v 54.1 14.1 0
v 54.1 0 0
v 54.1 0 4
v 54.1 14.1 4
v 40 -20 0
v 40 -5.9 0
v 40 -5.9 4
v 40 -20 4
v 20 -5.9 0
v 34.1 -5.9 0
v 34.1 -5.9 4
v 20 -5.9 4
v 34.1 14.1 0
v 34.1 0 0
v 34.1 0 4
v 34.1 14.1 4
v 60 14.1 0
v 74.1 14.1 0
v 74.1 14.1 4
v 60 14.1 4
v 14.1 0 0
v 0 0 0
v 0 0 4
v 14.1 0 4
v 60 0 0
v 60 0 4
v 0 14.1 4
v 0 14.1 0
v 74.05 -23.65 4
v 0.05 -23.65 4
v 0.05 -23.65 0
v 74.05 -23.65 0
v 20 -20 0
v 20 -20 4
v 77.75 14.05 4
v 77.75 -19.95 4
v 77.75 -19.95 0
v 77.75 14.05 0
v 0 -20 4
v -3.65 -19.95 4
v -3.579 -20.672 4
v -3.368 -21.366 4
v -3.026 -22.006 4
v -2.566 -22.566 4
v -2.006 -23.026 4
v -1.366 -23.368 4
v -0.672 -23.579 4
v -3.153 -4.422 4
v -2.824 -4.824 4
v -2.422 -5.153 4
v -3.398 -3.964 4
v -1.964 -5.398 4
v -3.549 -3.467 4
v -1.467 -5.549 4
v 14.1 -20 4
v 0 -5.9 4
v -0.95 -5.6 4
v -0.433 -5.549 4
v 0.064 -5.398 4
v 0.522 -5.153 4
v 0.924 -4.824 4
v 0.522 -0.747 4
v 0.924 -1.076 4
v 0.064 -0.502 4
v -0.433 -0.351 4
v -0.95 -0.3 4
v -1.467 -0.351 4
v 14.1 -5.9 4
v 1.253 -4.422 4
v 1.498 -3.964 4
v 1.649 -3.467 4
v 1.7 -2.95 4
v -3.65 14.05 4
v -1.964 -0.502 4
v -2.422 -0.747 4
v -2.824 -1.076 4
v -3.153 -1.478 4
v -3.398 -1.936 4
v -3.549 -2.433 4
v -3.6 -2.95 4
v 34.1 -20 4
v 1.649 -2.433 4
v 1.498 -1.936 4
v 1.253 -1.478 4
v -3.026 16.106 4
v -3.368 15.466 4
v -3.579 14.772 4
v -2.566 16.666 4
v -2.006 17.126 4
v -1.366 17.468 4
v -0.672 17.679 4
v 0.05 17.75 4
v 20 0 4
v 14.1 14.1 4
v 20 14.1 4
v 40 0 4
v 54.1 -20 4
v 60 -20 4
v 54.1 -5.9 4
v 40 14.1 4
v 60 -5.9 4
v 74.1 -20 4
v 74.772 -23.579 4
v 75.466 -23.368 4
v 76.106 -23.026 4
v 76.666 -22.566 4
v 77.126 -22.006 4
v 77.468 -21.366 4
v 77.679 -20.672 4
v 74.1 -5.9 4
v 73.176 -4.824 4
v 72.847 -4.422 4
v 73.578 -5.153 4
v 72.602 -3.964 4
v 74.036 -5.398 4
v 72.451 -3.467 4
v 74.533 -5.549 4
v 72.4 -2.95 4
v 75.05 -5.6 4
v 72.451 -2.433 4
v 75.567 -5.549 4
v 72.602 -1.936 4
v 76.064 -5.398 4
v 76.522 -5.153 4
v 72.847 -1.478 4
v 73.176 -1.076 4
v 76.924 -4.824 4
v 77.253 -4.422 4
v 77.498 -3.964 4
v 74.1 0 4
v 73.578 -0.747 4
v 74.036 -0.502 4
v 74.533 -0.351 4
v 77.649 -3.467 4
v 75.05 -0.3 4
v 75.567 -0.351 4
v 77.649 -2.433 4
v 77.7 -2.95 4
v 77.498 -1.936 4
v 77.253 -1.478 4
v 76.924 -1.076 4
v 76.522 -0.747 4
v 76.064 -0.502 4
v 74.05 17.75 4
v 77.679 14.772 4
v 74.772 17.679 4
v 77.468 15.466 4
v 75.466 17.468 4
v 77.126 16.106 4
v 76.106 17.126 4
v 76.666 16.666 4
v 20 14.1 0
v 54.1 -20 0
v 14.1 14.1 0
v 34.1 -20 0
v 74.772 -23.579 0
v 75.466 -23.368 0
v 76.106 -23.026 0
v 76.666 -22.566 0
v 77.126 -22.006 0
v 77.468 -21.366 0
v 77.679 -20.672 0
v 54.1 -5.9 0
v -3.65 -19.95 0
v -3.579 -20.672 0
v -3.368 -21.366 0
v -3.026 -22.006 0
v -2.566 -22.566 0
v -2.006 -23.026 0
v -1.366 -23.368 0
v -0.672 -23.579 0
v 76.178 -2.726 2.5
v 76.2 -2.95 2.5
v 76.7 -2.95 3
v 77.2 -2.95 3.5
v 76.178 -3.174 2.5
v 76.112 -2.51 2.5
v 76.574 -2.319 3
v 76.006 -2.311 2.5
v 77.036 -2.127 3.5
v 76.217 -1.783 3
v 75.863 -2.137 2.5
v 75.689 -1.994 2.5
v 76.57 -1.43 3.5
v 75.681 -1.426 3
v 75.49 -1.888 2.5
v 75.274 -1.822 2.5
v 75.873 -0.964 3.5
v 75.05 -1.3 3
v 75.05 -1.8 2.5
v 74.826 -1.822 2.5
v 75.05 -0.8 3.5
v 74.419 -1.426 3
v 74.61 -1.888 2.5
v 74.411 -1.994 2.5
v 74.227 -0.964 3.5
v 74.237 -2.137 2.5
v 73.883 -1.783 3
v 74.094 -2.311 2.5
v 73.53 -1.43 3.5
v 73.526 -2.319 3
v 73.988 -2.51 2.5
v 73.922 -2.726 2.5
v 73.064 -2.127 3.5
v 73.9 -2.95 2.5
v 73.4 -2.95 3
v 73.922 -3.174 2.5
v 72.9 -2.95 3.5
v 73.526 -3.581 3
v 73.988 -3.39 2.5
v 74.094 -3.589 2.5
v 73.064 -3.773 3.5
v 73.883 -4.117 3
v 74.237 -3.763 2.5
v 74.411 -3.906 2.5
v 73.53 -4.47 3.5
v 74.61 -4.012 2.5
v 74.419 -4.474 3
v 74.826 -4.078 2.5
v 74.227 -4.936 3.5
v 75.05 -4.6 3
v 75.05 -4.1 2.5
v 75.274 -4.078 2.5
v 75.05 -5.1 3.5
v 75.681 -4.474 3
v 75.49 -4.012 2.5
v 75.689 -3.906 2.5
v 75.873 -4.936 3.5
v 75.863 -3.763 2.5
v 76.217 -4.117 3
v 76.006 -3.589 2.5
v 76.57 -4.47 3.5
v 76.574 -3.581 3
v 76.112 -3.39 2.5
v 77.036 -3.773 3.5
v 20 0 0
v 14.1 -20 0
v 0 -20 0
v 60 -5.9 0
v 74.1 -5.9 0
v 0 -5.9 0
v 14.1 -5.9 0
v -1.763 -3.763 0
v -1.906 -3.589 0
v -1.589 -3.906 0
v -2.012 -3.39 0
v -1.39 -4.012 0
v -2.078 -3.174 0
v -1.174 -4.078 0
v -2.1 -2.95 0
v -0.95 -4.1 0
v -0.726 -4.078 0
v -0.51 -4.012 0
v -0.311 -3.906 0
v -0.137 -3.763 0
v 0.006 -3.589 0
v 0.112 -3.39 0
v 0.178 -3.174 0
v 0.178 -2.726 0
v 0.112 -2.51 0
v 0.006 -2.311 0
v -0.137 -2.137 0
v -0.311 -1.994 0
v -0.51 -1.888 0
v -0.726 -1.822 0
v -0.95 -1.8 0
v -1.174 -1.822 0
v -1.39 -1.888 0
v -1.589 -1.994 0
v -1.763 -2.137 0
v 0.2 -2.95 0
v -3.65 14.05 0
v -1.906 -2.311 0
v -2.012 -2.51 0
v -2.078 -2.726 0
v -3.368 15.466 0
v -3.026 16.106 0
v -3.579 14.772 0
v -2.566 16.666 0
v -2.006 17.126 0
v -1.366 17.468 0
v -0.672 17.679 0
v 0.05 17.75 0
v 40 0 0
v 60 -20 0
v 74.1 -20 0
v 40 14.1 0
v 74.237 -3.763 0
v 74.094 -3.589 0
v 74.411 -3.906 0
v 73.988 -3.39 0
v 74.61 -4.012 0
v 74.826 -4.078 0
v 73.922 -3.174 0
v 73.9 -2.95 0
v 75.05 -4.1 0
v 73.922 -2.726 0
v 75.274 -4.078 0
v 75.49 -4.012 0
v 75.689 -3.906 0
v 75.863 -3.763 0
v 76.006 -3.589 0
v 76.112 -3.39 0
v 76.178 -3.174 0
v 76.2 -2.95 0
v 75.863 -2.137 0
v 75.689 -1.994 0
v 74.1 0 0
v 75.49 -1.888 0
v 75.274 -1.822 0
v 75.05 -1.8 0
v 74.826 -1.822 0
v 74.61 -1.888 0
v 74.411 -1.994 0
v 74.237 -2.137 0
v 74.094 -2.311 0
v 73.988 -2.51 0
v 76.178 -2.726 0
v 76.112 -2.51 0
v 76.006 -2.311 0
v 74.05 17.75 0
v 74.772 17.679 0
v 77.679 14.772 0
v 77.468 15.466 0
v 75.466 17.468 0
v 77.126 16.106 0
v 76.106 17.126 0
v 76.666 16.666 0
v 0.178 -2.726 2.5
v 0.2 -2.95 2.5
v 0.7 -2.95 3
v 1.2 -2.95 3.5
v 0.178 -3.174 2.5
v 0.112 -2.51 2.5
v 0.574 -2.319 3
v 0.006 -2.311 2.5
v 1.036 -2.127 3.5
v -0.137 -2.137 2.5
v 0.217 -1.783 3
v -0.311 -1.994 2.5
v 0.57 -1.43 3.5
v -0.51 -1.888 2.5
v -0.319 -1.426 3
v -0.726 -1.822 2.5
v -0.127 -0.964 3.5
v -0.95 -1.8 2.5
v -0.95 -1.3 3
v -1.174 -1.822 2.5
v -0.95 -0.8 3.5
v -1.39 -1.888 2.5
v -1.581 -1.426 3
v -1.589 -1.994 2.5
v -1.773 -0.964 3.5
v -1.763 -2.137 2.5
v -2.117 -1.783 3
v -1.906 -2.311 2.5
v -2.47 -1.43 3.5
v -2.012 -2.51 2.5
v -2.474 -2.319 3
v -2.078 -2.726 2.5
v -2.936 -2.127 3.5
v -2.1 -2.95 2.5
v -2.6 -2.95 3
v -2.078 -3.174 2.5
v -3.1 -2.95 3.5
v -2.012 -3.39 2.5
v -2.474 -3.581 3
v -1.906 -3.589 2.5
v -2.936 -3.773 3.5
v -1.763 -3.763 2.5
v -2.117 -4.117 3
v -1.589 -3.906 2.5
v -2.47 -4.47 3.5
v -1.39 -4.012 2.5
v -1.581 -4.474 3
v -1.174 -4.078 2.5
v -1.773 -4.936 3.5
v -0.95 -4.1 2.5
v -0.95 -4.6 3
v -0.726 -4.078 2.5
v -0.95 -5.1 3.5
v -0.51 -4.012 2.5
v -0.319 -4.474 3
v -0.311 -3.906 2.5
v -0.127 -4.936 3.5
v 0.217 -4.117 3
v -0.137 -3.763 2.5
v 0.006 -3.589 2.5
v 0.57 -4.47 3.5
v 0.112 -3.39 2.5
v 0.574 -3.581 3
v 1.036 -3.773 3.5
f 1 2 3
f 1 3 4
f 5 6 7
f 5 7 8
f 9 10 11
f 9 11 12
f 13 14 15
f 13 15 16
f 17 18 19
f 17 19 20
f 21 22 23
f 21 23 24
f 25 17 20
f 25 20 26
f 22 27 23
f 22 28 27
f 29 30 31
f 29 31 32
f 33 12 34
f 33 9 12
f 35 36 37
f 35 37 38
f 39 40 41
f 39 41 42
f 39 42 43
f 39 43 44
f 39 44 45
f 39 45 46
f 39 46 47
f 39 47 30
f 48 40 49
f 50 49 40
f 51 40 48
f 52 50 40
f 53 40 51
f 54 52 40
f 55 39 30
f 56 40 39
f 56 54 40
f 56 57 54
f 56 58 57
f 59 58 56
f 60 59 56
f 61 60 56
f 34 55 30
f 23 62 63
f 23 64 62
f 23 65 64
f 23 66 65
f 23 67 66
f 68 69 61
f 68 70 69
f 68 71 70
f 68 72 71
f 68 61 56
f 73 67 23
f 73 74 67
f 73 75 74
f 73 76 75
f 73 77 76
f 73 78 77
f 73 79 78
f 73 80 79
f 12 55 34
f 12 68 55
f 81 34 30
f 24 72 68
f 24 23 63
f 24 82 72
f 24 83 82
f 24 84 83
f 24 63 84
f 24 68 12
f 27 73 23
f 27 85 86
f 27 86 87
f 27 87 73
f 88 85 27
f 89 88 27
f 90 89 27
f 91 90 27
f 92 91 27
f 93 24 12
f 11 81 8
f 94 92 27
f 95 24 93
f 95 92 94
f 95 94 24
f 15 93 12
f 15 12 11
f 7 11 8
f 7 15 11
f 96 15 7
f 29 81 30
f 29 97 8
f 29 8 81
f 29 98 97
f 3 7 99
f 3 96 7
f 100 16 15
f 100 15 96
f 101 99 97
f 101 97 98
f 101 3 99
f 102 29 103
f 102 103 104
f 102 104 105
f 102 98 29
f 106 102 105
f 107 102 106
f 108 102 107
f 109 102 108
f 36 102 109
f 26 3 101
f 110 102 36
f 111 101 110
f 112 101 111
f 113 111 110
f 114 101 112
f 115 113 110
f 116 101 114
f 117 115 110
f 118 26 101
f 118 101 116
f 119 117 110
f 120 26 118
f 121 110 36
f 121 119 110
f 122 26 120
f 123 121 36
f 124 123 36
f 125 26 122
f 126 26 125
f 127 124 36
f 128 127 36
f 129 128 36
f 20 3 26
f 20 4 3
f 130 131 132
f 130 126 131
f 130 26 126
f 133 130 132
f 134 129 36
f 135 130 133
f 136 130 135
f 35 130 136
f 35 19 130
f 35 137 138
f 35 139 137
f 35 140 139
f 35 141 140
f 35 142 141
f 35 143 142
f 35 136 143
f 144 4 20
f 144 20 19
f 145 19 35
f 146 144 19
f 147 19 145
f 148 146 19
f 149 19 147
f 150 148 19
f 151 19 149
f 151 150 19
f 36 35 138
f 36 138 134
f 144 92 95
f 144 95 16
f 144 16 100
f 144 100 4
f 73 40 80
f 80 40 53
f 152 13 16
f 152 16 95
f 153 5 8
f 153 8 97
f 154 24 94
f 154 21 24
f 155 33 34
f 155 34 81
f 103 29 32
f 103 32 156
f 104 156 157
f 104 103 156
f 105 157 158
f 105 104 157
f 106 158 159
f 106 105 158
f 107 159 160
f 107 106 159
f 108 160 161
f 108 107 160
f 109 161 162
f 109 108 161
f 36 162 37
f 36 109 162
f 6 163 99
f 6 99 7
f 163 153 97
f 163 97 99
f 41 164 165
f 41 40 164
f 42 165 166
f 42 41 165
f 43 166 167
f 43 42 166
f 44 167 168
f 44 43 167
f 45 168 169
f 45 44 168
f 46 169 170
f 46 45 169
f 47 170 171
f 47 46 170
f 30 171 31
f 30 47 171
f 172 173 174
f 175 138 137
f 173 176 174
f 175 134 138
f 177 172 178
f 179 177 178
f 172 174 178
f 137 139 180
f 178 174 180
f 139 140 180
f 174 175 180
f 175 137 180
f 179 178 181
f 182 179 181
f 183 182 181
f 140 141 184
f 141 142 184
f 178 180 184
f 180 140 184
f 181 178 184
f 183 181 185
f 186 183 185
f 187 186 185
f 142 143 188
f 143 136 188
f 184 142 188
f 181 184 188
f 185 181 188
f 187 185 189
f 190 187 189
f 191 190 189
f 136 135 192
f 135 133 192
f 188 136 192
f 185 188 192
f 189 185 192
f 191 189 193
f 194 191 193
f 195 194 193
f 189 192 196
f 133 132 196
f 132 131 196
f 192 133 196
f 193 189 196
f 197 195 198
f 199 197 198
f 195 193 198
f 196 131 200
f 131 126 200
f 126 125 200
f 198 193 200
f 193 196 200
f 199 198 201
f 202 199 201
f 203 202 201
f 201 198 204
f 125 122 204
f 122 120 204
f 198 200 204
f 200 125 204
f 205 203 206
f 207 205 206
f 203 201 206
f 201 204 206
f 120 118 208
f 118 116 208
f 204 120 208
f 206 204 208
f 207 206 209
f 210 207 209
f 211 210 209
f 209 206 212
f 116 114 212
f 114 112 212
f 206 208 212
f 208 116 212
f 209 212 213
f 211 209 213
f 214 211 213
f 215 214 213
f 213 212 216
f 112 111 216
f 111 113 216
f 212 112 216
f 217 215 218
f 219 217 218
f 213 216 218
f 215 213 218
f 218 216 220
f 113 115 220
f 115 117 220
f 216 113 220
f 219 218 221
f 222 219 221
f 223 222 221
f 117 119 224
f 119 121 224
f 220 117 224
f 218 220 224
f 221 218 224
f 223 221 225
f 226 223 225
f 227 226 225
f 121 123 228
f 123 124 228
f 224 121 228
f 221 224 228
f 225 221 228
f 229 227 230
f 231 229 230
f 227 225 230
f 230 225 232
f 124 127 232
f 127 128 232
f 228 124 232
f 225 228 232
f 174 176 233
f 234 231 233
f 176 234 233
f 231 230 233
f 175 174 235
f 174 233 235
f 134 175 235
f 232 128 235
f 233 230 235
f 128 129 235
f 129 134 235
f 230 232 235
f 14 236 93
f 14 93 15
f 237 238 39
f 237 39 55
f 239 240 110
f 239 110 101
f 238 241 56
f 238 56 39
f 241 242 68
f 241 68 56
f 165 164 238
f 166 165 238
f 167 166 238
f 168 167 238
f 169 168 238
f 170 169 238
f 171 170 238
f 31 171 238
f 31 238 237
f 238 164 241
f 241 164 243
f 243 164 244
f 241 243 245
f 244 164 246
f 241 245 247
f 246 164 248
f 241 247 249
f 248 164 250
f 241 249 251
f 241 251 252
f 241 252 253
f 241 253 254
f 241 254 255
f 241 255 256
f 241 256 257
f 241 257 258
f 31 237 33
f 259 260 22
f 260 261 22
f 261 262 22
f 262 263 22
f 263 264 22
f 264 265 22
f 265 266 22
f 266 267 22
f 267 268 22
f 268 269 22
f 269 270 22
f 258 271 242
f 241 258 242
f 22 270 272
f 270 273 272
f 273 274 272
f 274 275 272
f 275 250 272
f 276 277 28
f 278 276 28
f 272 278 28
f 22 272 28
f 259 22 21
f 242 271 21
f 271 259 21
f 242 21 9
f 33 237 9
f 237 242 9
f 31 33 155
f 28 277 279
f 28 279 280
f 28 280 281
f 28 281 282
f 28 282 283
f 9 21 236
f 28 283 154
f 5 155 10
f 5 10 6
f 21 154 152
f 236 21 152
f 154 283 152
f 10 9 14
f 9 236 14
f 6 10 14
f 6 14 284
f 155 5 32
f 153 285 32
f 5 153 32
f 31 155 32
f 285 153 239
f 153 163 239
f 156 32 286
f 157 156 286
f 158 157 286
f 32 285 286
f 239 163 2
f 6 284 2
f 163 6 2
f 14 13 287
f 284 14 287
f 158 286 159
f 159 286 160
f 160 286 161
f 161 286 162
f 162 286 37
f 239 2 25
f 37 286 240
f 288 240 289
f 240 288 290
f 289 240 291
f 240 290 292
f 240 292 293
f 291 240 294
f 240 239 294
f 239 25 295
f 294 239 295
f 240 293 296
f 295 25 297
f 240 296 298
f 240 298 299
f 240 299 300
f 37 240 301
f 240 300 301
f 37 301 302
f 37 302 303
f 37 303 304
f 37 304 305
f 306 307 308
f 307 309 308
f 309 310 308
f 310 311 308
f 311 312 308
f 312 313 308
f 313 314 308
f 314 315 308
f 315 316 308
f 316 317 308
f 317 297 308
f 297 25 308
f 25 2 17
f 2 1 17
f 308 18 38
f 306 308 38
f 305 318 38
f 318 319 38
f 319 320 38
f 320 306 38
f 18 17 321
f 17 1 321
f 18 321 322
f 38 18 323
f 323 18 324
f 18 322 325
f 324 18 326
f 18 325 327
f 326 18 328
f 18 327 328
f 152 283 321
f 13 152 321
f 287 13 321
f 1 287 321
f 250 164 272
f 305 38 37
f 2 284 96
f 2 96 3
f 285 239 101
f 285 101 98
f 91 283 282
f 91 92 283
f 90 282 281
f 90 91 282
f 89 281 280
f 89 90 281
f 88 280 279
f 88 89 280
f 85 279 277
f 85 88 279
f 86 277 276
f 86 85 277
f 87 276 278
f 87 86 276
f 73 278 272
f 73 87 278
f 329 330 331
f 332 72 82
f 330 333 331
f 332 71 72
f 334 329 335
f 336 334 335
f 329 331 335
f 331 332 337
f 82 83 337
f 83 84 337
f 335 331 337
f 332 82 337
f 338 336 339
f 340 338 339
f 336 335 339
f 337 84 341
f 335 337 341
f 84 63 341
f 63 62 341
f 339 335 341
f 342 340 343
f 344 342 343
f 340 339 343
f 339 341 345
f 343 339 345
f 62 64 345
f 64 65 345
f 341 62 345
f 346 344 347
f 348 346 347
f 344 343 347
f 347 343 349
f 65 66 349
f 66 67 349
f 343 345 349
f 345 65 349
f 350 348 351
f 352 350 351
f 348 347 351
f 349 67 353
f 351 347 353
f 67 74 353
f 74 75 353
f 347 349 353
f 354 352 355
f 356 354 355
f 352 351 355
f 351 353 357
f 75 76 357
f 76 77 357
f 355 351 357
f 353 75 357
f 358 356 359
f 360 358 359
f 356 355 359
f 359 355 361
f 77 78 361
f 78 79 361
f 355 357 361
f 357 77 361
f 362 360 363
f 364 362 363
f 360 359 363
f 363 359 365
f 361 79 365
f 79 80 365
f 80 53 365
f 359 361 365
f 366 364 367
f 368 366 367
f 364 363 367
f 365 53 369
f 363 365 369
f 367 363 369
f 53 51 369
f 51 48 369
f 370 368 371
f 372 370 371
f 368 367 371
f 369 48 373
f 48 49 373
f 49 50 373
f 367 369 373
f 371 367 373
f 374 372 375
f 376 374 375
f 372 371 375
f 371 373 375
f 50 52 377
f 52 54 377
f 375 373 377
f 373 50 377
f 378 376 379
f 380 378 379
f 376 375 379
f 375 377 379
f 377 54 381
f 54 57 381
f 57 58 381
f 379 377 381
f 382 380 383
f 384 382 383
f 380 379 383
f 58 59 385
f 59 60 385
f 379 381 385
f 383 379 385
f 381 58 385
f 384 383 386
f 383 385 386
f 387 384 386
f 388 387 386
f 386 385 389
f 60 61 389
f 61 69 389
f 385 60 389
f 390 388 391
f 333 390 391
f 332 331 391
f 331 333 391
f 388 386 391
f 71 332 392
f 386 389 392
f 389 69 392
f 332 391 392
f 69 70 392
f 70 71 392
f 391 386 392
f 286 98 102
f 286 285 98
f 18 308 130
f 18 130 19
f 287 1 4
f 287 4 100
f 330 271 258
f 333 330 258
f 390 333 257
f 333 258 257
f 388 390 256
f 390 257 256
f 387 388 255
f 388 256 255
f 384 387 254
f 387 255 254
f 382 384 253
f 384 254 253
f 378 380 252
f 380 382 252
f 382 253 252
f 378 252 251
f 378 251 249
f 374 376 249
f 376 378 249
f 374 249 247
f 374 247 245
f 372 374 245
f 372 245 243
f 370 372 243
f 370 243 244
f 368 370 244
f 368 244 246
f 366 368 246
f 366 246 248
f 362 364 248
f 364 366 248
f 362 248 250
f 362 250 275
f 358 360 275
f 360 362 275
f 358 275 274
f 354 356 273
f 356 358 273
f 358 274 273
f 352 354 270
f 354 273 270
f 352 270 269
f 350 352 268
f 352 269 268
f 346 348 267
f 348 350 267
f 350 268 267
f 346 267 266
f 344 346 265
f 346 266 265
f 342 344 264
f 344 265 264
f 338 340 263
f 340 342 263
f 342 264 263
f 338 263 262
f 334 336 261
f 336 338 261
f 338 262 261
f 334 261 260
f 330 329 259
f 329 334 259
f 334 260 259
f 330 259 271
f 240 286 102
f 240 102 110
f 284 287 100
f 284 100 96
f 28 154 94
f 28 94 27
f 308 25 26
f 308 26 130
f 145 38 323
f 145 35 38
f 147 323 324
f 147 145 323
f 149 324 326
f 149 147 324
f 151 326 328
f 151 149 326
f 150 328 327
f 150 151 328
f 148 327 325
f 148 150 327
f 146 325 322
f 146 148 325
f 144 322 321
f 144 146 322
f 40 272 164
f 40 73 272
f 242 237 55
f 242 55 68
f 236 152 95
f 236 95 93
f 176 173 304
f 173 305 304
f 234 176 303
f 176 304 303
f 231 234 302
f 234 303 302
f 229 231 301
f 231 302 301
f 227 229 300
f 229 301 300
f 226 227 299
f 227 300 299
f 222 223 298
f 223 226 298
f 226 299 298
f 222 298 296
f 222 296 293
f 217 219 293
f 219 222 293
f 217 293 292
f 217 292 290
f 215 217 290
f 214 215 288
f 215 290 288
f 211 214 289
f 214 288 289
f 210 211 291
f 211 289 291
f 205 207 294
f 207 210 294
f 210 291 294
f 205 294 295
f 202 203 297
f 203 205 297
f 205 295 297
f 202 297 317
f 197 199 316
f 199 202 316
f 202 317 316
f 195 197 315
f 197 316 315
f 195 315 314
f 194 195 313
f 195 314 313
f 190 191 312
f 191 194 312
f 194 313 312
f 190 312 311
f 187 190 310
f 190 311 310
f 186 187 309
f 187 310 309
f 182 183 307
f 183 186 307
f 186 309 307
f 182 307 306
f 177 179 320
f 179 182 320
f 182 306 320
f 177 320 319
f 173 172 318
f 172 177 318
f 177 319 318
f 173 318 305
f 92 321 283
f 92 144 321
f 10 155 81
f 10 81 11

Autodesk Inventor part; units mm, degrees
ref_plane "YZ Plane" through (0, 0, 0) normal (1, 0, 0) x (0, 1, 0)
ref_plane "XZ Plane" through (0, 0, 0) normal (0, 1, 0) x (-1, 0, 0)
ref_plane "XY Plane" through (0, 0, 0) normal (0, 0, 1) x (1, 0, 0)
sketch "Sketch2" plane through (0, 0, 0) normal (0, 0, 1) x (1, 0, 0)
  line L0 (0, 0) -> (14.1, 0)
  line L1 (14.1, 0) -> (14.1, 14.1)
  line L2 (14.1, 14.1) -> (0, 14.1)
  line L3 (0, 14.1) -> (0, 0)
  line L4 (20, 0) -> (34.1, 0)
  line L5 (34.1, 0) -> (34.1, 14.1)
  line L6 (34.1, 14.1) -> (20, 14.1)
  line L7 (20, 14.1) -> (20, 0)
  line L8 (40, 0) -> (54.1, 0)
  line L9 (54.1, 0) -> (54.1, 14.1)
  line L10 (54.1, 14.1) -> (40, 14.1)
  line L11 (40, 14.1) -> (40, 0)
  line L12 (60, 0) -> (74.1, 0)
  line L13 (74.1, 0) -> (74.1, 14.1)
  line L14 (74.1, 14.1) -> (60, 14.1)
  line L15 (60, 14.1) -> (60, 0)
  line L16 (0, -20) -> (14.1, -20)
  line L17 (14.1, -20) -> (14.1, -5.9)
  line L18 (14.1, -5.9) -> (0, -5.9)
  line L19 (0, -5.9) -> (0, -20)
  line L20 (20, -20) -> (34.1, -20)
  line L21 (34.1, -20) -> (34.1, -5.9)
  line L22 (34.1, -5.9) -> (20, -5.9)
  line L23 (20, -5.9) -> (20, -20)
  line L24 (40, -20) -> (54.1, -20)
  line L25 (54.1, -20) -> (54.1, -5.9)
  line L26 (54.1, -5.9) -> (40, -5.9)
  line L27 (40, -5.9) -> (40, -20)
  line L28 (60, -20) -> (74.1, -20)
  line L29 (74.1, -20) -> (74.1, -5.9)
  line L30 (74.1, -5.9) -> (60, -5.9)
  line L31 (60, -5.9) -> (60, -20)
  line L32 (0.05, 18.05) -> (74.05, 18.05)
  line L33 (78.05, 14.05) -> (78.05, -19.95)
  line L34 (74.05, -23.95) -> (0.05, -23.95)
  line L35 (-3.95, -19.95) -> (-3.95, 14.05)
  arc A0 (0.05, 18.05) -> (-3.95, 14.05) centre (0.05, 14.05) ccw
  arc A1 (-3.95, -19.95) -> (0.05, -23.95) centre (0.05, -19.95) ccw
  arc A2 (74.05, -23.95) -> (78.05, -19.95) centre (74.05, -19.95) ccw
  arc A3 (78.05, 14.05) -> (74.05, 18.05) centre (74.05, 14.05) ccw
  circle A4 centre (-0.95, -2.95) radius 1.15
  circle A5 centre (75.05, -2.95) radius 1.15
  point P0 (-3.95, 18.05)
  point P1 (78.05, -23.95)
  point P2 (78.05, 18.05)
  point P3 (-3.95, -23.95)
  dimension "d0" = 14.1
  dimension "d1" = 14.1
  dimension "d6" = 20
  dimension "d9" = 20
  dimension "d18" = 4
  dimension "d19" = 2.3
  dimension "d20" = 3
  dimension "d22" = 21
  dimension "d23" = 42
  dimension "d24" = 82
  dimension "d25" = 3
  dimension "d26" = 21
  dimension "d27" = 23.95
  dimension "d28" = 38.05
extrude "Extrusion1" add sketch "Sketch2" along normal blind 4
chamfer "Chamfer1" distance 1.5 angle 45 2 edges at (-2.1, -2.95, 4) (73.9, -2.95, 4)
sketch "Sketch3" plane through (0, 0, 4) normal (0, 0, 1) x (1, 0, 0)
  line L0 (0.05, 18.05) -> (74.05, 18.05)
  line L1 (78.05, 14.05) -> (78.05, -19.95)
  line L2 (74.05, -23.95) -> (0.05, -23.95)
  line L3 (-3.95, -19.95) -> (-3.95, 14.05)
  arc A0 (0.05, 18.05) -> (-3.95, 14.05) centre (0.05, 14.05) ccw
  arc A1 (-3.95, -19.95) -> (0.05, -23.95) centre (0.05, -19.95) ccw
  arc A2 (74.05, -23.95) -> (78.05, -19.95) centre (74.05, -19.95) ccw
  arc A3 (78.05, 14.05) -> (74.05, 18.05) centre (74.05, 14.05) ccw
  line L4 (74.05, 17.75) -> (0.05, 17.75)
  arc A4 (0.05, 17.75) -> (-3.65, 14.05) centre (0.05, 14.05) ccw
  line L5 (-3.65, 14.05) -> (-3.65, -19.95)
  arc A5 (-3.65, -19.95) -> (0.05, -23.65) centre (0.05, -19.95) ccw
  line L6 (0.05, -23.65) -> (74.05, -23.65)
  arc A6 (74.05, -23.65) -> (77.75, -19.95) centre (74.05, -19.95) ccw
  line L7 (77.75, -19.95) -> (77.75, 14.05)
  arc A7 (77.75, 14.05) -> (74.05, 17.75) centre (74.05, 14.05) ccw
  point P0 (0, 0)
  dimension "d32" = 4
  dimension "d33" = 0.3
extrude "Extrusion2" cut sketch "Sketch3" against normal blind 10
properties part number "Plate"
